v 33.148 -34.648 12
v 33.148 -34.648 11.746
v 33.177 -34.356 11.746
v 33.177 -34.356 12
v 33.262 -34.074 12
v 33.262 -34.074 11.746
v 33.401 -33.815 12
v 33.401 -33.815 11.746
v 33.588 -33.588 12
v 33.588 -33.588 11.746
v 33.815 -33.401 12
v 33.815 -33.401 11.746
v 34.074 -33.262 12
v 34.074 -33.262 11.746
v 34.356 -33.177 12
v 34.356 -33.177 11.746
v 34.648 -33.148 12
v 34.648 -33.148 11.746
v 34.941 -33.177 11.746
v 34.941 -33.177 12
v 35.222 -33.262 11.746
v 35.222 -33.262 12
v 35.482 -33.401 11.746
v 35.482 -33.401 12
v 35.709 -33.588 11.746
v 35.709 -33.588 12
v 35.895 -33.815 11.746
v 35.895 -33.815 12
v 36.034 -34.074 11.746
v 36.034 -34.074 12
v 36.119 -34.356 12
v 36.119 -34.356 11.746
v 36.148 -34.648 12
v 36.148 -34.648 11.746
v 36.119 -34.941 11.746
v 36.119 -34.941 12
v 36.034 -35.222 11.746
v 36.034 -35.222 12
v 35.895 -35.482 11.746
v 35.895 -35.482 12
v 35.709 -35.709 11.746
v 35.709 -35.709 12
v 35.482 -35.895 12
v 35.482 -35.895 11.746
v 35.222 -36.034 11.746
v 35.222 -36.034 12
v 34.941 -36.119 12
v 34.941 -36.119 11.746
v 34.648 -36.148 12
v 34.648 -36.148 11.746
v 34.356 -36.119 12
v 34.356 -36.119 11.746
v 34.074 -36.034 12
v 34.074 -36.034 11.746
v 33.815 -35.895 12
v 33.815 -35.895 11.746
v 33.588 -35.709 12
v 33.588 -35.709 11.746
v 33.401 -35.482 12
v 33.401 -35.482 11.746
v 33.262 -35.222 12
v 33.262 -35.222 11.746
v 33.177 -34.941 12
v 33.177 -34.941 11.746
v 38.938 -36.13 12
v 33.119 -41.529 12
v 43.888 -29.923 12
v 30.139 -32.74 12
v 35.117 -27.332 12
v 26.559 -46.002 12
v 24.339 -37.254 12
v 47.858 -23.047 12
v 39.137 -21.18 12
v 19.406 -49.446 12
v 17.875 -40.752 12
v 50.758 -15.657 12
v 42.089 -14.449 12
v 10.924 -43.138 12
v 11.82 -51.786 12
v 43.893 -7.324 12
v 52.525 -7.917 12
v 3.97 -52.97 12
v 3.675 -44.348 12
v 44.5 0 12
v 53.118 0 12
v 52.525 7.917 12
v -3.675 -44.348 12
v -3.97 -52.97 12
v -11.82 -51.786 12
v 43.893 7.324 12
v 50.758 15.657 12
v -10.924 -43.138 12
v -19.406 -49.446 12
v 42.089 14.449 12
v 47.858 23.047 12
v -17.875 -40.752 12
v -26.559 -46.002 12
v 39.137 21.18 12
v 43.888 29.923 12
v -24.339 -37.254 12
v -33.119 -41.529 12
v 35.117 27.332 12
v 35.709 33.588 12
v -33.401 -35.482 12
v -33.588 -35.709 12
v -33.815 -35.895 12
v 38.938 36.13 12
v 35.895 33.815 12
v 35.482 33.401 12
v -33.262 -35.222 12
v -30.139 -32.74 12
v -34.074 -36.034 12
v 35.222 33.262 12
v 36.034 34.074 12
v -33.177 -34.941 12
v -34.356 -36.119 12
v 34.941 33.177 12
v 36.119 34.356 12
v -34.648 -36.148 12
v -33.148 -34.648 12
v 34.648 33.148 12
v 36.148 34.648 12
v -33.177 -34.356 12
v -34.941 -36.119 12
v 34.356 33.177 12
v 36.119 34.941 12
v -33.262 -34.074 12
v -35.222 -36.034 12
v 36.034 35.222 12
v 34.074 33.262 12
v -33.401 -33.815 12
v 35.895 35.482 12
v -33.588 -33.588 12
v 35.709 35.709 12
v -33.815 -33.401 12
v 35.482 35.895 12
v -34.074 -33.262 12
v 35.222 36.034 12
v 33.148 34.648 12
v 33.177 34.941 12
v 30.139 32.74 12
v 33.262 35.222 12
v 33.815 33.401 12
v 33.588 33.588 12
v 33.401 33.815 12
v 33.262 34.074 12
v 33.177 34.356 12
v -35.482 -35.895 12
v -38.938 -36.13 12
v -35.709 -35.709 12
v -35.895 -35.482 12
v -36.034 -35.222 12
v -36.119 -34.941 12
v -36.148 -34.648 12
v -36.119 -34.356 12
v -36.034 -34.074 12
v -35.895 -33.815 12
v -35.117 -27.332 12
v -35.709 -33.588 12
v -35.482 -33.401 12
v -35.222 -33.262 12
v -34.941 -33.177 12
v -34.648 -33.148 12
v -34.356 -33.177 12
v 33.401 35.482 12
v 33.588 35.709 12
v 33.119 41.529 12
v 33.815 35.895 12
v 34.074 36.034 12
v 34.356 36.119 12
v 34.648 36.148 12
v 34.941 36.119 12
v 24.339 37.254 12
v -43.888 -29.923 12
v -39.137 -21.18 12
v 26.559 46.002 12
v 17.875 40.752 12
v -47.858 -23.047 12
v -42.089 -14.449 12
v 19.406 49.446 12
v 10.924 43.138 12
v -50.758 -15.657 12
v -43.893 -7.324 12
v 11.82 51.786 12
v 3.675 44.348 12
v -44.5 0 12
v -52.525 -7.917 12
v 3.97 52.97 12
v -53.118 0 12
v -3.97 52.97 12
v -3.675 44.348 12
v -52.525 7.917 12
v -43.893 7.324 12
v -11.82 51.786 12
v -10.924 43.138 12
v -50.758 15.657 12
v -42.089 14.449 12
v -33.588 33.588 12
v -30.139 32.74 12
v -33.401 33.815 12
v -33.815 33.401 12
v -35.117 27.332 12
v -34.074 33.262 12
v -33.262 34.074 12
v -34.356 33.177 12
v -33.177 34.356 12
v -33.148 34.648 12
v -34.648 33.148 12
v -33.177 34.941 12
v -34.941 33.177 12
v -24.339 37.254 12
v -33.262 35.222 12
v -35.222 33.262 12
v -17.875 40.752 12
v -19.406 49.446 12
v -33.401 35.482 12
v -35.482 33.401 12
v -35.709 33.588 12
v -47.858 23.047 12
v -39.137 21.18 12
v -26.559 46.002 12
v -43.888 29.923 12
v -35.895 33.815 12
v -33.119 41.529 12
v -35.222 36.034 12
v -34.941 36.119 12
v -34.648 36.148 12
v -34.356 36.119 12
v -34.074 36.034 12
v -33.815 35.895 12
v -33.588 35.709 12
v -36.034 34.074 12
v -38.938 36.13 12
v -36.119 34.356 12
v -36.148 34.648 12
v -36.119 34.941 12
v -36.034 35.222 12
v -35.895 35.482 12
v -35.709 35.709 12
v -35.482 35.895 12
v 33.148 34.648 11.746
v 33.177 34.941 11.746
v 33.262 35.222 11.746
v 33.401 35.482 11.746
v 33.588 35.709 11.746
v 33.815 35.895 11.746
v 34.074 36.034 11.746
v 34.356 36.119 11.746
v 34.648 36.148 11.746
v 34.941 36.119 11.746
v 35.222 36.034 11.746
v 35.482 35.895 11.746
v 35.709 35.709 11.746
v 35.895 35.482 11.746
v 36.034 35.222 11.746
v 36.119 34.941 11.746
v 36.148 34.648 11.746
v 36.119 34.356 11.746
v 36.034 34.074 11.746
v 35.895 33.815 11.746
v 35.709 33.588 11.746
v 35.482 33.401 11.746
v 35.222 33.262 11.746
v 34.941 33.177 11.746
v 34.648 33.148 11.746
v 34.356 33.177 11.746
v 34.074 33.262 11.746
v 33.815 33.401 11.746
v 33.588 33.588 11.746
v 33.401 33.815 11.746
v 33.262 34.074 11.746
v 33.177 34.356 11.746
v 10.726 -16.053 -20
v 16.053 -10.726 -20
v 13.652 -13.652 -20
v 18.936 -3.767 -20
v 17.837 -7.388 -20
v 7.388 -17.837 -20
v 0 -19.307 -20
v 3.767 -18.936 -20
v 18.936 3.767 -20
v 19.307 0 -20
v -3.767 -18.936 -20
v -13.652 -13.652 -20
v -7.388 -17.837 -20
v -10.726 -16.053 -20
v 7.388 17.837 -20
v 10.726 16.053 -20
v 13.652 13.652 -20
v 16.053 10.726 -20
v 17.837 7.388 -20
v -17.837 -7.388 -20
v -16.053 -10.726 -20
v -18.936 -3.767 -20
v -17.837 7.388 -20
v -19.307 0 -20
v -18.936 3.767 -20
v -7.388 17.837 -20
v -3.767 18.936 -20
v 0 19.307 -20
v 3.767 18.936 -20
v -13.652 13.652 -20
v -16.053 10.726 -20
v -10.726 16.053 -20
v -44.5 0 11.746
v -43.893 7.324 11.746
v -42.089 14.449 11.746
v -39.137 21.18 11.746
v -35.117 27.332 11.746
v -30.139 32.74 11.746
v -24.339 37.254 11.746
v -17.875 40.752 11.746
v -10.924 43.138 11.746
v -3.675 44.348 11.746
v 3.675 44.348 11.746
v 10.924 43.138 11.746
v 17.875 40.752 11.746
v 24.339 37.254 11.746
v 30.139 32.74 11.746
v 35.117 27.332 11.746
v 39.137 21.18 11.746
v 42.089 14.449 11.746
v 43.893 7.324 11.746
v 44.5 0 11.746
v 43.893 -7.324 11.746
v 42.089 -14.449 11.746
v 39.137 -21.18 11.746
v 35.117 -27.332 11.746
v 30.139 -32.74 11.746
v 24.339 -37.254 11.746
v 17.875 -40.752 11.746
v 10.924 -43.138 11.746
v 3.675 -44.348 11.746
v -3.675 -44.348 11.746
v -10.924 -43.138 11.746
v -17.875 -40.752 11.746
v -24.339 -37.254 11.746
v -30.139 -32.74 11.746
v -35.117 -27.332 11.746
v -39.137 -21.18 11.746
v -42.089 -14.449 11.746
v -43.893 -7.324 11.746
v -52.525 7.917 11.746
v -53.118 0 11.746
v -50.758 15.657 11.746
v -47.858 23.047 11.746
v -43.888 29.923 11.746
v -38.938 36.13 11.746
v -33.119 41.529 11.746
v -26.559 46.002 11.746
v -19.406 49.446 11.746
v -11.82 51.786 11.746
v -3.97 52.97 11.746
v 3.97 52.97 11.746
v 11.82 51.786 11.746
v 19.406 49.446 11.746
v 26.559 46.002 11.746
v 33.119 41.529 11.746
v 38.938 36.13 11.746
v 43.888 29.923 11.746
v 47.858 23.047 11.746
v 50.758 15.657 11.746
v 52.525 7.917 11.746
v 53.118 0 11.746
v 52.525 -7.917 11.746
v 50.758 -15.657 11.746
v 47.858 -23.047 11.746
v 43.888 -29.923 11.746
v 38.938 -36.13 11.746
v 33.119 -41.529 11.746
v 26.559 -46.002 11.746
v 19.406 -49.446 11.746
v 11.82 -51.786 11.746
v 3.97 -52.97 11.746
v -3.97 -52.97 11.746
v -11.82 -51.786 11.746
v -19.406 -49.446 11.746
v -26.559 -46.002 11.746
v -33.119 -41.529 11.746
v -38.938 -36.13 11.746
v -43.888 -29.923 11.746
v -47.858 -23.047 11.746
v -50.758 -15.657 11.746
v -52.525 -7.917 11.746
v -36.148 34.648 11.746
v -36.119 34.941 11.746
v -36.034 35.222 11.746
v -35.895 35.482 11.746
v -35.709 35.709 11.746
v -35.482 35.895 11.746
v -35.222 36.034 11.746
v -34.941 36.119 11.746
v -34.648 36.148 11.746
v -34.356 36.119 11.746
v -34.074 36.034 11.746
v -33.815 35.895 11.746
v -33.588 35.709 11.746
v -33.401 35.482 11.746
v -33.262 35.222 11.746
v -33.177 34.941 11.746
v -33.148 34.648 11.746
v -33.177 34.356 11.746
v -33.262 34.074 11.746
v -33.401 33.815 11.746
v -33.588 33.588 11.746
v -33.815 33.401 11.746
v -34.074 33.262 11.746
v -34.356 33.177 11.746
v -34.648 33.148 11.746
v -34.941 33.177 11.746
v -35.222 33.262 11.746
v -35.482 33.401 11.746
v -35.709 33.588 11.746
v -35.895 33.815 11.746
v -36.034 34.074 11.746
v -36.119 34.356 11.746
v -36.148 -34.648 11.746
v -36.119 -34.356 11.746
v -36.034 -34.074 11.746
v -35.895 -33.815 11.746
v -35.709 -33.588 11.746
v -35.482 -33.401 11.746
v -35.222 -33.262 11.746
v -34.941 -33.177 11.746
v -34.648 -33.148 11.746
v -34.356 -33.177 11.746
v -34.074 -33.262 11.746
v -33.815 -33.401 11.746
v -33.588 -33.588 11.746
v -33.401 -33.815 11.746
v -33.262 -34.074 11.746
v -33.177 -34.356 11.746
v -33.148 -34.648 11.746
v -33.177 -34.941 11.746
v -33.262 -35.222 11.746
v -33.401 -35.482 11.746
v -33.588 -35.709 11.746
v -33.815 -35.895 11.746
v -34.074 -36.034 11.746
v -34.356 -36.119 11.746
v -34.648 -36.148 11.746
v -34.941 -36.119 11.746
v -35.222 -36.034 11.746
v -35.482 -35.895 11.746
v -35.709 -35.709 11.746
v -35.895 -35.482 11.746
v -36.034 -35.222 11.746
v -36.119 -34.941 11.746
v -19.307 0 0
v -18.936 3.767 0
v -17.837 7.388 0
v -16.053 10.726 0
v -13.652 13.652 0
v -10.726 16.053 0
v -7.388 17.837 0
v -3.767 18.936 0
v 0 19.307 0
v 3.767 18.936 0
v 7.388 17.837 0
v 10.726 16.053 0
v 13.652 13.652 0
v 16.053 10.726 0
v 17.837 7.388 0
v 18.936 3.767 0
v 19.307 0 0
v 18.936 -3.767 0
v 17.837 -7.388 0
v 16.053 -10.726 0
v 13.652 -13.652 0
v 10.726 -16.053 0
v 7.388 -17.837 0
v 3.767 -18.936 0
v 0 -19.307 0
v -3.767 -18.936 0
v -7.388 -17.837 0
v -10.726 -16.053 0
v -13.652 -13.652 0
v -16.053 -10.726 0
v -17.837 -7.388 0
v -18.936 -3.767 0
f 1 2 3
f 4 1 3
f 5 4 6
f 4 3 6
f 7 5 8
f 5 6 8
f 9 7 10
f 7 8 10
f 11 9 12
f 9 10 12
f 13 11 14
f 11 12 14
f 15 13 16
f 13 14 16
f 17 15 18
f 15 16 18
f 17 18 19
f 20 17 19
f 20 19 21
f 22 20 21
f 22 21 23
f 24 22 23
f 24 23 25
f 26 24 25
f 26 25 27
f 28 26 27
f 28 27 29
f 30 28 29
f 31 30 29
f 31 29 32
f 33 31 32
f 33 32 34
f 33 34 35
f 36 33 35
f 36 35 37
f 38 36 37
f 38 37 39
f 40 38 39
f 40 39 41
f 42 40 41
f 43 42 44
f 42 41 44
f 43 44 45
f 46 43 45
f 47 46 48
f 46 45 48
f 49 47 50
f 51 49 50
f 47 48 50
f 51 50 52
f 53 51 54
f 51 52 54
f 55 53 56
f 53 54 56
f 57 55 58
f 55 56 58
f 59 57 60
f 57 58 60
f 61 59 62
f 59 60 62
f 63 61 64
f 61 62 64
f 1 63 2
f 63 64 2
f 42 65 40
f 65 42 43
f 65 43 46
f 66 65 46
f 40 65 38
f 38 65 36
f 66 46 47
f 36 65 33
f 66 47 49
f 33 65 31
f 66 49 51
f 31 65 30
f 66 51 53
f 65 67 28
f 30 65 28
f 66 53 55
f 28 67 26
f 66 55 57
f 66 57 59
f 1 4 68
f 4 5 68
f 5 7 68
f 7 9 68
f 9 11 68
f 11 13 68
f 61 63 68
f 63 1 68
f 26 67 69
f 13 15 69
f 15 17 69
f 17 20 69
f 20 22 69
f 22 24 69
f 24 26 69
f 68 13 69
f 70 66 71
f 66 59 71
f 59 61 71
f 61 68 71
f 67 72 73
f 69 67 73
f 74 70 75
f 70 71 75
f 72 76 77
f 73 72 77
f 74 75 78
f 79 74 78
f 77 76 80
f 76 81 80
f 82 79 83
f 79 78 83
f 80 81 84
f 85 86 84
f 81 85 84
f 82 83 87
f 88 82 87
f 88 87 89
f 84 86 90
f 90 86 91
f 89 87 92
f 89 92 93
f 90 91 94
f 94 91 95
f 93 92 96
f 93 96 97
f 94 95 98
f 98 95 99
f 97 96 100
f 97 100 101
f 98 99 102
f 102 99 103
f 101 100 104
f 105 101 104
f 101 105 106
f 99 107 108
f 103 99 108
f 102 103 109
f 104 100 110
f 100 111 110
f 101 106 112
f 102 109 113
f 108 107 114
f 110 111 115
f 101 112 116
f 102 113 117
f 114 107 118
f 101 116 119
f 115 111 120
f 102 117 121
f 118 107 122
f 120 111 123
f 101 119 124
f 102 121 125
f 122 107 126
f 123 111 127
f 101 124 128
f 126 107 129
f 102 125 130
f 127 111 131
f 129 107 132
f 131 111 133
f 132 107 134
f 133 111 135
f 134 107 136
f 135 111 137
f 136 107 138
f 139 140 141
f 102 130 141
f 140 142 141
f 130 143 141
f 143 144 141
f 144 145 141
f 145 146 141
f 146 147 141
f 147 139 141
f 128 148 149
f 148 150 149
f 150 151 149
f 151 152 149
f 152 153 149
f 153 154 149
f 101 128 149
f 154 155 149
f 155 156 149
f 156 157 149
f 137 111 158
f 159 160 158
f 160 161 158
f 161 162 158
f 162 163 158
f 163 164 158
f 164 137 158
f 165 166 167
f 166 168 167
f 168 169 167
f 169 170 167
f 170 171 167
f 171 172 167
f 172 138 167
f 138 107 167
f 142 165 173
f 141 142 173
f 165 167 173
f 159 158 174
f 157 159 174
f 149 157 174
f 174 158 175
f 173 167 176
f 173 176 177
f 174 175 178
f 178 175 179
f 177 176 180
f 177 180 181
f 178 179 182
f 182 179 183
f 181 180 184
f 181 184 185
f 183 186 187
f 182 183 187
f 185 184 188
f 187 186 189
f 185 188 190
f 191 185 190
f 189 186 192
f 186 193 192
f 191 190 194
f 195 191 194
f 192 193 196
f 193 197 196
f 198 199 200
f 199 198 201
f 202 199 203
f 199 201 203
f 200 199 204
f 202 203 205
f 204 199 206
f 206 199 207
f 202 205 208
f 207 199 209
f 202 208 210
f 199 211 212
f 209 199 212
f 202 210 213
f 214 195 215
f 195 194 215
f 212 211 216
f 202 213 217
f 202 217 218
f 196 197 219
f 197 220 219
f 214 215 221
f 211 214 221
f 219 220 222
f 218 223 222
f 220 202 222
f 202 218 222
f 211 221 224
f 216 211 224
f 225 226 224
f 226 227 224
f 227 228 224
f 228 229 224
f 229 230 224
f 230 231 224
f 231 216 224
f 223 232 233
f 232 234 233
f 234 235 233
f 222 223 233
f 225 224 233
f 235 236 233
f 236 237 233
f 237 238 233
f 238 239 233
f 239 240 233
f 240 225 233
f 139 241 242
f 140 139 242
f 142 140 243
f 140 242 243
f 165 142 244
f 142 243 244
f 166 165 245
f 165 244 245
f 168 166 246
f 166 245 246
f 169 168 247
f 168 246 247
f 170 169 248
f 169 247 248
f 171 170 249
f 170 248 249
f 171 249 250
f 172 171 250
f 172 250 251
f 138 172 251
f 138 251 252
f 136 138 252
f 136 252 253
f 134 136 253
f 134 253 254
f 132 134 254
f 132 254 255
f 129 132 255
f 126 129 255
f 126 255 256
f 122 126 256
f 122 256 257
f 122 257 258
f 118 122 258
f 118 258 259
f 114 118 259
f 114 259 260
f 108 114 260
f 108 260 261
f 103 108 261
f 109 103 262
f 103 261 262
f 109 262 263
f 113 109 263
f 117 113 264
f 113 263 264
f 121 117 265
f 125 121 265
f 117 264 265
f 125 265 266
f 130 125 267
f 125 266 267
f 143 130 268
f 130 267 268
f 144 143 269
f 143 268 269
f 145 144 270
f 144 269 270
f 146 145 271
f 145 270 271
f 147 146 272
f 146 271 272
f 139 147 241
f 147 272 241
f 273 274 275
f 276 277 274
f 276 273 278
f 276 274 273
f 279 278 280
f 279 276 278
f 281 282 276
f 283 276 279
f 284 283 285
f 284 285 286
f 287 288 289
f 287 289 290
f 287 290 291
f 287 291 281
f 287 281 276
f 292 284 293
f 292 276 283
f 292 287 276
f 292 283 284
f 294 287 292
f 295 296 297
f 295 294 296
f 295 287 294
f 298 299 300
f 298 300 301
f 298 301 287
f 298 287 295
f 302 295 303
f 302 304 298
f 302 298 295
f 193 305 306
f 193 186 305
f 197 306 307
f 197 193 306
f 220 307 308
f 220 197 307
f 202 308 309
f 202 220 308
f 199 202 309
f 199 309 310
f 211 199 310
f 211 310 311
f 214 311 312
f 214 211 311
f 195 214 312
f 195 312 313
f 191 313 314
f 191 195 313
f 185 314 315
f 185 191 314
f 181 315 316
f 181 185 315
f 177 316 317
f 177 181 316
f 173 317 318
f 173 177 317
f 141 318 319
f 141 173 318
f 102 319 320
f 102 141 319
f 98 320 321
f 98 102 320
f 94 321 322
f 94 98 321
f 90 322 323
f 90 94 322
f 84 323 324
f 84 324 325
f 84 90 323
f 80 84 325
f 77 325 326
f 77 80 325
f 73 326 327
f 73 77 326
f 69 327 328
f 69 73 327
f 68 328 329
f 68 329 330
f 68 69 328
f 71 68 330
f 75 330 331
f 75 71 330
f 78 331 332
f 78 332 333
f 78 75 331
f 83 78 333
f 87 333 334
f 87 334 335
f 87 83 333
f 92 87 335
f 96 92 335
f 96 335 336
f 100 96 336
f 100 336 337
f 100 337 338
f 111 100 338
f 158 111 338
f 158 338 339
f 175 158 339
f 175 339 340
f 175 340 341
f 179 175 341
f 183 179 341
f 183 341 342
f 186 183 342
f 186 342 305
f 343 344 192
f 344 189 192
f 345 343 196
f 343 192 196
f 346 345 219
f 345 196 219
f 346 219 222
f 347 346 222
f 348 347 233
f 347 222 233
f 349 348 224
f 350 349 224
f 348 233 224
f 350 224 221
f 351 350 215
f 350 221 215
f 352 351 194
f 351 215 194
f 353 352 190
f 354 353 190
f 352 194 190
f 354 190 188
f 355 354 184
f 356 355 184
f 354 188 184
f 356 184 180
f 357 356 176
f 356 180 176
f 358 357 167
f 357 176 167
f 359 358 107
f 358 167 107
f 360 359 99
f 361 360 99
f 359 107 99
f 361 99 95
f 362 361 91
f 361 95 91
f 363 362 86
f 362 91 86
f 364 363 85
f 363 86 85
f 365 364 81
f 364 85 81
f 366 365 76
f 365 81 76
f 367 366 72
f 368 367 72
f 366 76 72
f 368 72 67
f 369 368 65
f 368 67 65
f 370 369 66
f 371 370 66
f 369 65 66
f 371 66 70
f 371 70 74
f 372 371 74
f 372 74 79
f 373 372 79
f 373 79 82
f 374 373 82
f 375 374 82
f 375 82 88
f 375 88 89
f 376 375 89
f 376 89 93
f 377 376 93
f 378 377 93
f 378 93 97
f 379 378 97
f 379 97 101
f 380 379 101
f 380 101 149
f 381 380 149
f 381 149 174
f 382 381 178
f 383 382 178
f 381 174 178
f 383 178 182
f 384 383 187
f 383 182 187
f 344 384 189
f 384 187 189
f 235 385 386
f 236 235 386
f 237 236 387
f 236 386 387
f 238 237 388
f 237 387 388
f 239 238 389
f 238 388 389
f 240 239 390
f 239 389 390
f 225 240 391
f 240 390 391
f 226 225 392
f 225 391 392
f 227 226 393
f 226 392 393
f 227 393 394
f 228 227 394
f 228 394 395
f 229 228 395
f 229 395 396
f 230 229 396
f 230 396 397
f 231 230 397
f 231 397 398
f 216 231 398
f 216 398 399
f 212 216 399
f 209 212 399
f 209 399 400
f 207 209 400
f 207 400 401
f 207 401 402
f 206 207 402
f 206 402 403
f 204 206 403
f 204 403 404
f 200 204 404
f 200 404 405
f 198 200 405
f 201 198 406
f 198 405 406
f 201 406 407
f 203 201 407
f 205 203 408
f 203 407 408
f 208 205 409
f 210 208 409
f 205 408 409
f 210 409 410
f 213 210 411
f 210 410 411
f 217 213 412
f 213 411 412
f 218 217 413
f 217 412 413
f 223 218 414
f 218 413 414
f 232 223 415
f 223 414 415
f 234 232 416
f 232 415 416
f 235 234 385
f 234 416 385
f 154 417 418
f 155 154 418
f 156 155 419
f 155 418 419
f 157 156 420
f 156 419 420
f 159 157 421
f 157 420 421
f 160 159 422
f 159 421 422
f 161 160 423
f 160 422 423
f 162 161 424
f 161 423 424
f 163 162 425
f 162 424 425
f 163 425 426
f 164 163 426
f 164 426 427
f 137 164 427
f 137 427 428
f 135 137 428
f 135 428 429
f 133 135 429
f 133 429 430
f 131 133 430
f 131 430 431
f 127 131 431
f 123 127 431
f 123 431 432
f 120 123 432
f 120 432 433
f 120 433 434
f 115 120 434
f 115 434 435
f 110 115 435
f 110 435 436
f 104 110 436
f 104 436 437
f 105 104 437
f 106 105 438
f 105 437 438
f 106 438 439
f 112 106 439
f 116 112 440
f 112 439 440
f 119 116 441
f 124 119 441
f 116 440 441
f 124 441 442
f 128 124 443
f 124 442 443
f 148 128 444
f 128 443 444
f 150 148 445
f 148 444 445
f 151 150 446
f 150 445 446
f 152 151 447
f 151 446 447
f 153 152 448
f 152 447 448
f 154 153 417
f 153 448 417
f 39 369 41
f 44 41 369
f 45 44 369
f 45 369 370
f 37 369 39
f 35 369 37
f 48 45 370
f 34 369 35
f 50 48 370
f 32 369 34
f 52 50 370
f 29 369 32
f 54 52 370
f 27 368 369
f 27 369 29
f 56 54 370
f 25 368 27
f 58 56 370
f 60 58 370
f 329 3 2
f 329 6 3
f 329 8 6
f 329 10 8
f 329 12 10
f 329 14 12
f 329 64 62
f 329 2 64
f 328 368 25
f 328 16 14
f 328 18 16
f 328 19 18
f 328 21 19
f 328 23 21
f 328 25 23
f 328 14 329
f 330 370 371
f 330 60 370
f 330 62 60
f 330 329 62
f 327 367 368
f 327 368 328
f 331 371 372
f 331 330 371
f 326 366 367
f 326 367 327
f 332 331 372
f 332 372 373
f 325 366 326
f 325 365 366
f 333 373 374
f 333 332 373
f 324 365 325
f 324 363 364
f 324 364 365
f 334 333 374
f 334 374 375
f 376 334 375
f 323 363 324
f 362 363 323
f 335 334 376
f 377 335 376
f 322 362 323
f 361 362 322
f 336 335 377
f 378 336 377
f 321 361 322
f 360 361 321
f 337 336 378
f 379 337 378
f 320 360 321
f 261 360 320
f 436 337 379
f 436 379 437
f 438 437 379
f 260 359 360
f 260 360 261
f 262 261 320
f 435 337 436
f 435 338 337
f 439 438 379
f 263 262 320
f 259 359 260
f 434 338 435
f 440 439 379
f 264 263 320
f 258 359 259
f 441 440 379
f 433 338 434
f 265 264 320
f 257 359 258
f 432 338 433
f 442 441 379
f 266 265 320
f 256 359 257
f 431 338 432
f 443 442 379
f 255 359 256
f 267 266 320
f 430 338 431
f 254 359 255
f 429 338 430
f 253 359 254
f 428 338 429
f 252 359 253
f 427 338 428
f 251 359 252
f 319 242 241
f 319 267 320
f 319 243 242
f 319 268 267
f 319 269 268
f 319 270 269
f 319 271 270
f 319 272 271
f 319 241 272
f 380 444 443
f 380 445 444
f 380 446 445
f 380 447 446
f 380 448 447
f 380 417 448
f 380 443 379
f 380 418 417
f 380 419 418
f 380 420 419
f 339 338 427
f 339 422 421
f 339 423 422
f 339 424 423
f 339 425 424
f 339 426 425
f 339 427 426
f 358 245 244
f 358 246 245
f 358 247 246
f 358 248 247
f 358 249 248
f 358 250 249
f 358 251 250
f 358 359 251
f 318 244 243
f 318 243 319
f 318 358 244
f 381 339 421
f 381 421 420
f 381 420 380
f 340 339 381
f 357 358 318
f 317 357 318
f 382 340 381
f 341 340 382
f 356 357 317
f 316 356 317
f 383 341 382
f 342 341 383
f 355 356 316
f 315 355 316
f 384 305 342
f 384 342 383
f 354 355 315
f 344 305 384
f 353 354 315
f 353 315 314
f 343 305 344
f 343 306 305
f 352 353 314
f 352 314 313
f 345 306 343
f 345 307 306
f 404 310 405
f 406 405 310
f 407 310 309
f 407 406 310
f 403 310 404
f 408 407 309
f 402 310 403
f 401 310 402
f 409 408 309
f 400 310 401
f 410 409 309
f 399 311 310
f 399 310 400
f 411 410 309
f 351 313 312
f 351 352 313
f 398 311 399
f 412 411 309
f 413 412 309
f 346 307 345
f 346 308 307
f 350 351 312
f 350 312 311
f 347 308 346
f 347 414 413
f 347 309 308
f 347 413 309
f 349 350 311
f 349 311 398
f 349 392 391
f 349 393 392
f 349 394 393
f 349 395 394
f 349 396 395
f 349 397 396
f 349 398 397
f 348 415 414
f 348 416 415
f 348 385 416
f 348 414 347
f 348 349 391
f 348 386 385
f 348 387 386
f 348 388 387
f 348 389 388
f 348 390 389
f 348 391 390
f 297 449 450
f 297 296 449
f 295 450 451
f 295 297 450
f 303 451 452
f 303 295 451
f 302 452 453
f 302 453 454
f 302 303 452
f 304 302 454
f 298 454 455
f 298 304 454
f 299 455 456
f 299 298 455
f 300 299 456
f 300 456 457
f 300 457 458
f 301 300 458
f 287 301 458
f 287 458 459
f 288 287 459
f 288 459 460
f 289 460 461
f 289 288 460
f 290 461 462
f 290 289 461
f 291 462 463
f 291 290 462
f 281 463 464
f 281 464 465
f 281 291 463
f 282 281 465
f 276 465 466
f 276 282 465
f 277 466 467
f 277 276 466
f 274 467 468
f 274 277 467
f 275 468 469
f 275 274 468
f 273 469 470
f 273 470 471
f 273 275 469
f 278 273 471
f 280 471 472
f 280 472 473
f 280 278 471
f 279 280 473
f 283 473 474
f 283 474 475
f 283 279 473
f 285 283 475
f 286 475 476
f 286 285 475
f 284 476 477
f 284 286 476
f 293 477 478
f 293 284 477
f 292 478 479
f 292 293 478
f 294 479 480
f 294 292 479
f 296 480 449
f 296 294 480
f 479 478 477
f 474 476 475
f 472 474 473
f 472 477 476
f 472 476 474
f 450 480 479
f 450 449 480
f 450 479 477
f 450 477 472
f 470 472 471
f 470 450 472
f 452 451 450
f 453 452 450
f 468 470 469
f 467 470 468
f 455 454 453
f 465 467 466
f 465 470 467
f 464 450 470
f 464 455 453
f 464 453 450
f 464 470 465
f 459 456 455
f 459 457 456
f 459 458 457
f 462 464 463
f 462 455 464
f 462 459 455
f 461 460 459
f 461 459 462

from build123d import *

# Parameters (mm, degrees)
F0_W = 8.6182065606
F0_H = 0.2540749386
F6_D = 3


# Not quite as in the source:
# - a feature names something its author has since deleted; it is built from what else it names
# - the program builds the solid bodies; features that only make, move or delete a surface that nothing else refers to are left out


with BuildPart() as f3:
    # F0 (on Front) → F3 (revolve)
    with BuildSketch(Plane.XZ):
        Polygon((-16.4538044245, 0), (-19.3070657551, 0), (-19.3070657551, -20), (0, -20), (0, 0), align=None)
    revolve(axis=Axis((0, 0, 10.1666413248), (0, 0, -1)))


with BuildPart() as f3b:
    # F0 (on Front) → F3, piece 2 (revolve)
    with BuildSketch(Plane.XZ):
        with Locations((-48.8091032803, 11.8729625307)):
            Rectangle(F0_W, F0_H)
    revolve(axis=Axis((0, 0, 10.1666413248), (0, 0, -1)))

    # F6 (through all)
    with Locations(Plane.XY.offset(12)):
        with Locations((-34.6482322781, 34.6482322781), (34.6482322781, 34.6482322781), (34.6482322781, -34.6482322781), (-34.6482322781, -34.6482322781)):
            Hole(F6_D / 2)


solid = Compound([f3.part, f3b.part])
